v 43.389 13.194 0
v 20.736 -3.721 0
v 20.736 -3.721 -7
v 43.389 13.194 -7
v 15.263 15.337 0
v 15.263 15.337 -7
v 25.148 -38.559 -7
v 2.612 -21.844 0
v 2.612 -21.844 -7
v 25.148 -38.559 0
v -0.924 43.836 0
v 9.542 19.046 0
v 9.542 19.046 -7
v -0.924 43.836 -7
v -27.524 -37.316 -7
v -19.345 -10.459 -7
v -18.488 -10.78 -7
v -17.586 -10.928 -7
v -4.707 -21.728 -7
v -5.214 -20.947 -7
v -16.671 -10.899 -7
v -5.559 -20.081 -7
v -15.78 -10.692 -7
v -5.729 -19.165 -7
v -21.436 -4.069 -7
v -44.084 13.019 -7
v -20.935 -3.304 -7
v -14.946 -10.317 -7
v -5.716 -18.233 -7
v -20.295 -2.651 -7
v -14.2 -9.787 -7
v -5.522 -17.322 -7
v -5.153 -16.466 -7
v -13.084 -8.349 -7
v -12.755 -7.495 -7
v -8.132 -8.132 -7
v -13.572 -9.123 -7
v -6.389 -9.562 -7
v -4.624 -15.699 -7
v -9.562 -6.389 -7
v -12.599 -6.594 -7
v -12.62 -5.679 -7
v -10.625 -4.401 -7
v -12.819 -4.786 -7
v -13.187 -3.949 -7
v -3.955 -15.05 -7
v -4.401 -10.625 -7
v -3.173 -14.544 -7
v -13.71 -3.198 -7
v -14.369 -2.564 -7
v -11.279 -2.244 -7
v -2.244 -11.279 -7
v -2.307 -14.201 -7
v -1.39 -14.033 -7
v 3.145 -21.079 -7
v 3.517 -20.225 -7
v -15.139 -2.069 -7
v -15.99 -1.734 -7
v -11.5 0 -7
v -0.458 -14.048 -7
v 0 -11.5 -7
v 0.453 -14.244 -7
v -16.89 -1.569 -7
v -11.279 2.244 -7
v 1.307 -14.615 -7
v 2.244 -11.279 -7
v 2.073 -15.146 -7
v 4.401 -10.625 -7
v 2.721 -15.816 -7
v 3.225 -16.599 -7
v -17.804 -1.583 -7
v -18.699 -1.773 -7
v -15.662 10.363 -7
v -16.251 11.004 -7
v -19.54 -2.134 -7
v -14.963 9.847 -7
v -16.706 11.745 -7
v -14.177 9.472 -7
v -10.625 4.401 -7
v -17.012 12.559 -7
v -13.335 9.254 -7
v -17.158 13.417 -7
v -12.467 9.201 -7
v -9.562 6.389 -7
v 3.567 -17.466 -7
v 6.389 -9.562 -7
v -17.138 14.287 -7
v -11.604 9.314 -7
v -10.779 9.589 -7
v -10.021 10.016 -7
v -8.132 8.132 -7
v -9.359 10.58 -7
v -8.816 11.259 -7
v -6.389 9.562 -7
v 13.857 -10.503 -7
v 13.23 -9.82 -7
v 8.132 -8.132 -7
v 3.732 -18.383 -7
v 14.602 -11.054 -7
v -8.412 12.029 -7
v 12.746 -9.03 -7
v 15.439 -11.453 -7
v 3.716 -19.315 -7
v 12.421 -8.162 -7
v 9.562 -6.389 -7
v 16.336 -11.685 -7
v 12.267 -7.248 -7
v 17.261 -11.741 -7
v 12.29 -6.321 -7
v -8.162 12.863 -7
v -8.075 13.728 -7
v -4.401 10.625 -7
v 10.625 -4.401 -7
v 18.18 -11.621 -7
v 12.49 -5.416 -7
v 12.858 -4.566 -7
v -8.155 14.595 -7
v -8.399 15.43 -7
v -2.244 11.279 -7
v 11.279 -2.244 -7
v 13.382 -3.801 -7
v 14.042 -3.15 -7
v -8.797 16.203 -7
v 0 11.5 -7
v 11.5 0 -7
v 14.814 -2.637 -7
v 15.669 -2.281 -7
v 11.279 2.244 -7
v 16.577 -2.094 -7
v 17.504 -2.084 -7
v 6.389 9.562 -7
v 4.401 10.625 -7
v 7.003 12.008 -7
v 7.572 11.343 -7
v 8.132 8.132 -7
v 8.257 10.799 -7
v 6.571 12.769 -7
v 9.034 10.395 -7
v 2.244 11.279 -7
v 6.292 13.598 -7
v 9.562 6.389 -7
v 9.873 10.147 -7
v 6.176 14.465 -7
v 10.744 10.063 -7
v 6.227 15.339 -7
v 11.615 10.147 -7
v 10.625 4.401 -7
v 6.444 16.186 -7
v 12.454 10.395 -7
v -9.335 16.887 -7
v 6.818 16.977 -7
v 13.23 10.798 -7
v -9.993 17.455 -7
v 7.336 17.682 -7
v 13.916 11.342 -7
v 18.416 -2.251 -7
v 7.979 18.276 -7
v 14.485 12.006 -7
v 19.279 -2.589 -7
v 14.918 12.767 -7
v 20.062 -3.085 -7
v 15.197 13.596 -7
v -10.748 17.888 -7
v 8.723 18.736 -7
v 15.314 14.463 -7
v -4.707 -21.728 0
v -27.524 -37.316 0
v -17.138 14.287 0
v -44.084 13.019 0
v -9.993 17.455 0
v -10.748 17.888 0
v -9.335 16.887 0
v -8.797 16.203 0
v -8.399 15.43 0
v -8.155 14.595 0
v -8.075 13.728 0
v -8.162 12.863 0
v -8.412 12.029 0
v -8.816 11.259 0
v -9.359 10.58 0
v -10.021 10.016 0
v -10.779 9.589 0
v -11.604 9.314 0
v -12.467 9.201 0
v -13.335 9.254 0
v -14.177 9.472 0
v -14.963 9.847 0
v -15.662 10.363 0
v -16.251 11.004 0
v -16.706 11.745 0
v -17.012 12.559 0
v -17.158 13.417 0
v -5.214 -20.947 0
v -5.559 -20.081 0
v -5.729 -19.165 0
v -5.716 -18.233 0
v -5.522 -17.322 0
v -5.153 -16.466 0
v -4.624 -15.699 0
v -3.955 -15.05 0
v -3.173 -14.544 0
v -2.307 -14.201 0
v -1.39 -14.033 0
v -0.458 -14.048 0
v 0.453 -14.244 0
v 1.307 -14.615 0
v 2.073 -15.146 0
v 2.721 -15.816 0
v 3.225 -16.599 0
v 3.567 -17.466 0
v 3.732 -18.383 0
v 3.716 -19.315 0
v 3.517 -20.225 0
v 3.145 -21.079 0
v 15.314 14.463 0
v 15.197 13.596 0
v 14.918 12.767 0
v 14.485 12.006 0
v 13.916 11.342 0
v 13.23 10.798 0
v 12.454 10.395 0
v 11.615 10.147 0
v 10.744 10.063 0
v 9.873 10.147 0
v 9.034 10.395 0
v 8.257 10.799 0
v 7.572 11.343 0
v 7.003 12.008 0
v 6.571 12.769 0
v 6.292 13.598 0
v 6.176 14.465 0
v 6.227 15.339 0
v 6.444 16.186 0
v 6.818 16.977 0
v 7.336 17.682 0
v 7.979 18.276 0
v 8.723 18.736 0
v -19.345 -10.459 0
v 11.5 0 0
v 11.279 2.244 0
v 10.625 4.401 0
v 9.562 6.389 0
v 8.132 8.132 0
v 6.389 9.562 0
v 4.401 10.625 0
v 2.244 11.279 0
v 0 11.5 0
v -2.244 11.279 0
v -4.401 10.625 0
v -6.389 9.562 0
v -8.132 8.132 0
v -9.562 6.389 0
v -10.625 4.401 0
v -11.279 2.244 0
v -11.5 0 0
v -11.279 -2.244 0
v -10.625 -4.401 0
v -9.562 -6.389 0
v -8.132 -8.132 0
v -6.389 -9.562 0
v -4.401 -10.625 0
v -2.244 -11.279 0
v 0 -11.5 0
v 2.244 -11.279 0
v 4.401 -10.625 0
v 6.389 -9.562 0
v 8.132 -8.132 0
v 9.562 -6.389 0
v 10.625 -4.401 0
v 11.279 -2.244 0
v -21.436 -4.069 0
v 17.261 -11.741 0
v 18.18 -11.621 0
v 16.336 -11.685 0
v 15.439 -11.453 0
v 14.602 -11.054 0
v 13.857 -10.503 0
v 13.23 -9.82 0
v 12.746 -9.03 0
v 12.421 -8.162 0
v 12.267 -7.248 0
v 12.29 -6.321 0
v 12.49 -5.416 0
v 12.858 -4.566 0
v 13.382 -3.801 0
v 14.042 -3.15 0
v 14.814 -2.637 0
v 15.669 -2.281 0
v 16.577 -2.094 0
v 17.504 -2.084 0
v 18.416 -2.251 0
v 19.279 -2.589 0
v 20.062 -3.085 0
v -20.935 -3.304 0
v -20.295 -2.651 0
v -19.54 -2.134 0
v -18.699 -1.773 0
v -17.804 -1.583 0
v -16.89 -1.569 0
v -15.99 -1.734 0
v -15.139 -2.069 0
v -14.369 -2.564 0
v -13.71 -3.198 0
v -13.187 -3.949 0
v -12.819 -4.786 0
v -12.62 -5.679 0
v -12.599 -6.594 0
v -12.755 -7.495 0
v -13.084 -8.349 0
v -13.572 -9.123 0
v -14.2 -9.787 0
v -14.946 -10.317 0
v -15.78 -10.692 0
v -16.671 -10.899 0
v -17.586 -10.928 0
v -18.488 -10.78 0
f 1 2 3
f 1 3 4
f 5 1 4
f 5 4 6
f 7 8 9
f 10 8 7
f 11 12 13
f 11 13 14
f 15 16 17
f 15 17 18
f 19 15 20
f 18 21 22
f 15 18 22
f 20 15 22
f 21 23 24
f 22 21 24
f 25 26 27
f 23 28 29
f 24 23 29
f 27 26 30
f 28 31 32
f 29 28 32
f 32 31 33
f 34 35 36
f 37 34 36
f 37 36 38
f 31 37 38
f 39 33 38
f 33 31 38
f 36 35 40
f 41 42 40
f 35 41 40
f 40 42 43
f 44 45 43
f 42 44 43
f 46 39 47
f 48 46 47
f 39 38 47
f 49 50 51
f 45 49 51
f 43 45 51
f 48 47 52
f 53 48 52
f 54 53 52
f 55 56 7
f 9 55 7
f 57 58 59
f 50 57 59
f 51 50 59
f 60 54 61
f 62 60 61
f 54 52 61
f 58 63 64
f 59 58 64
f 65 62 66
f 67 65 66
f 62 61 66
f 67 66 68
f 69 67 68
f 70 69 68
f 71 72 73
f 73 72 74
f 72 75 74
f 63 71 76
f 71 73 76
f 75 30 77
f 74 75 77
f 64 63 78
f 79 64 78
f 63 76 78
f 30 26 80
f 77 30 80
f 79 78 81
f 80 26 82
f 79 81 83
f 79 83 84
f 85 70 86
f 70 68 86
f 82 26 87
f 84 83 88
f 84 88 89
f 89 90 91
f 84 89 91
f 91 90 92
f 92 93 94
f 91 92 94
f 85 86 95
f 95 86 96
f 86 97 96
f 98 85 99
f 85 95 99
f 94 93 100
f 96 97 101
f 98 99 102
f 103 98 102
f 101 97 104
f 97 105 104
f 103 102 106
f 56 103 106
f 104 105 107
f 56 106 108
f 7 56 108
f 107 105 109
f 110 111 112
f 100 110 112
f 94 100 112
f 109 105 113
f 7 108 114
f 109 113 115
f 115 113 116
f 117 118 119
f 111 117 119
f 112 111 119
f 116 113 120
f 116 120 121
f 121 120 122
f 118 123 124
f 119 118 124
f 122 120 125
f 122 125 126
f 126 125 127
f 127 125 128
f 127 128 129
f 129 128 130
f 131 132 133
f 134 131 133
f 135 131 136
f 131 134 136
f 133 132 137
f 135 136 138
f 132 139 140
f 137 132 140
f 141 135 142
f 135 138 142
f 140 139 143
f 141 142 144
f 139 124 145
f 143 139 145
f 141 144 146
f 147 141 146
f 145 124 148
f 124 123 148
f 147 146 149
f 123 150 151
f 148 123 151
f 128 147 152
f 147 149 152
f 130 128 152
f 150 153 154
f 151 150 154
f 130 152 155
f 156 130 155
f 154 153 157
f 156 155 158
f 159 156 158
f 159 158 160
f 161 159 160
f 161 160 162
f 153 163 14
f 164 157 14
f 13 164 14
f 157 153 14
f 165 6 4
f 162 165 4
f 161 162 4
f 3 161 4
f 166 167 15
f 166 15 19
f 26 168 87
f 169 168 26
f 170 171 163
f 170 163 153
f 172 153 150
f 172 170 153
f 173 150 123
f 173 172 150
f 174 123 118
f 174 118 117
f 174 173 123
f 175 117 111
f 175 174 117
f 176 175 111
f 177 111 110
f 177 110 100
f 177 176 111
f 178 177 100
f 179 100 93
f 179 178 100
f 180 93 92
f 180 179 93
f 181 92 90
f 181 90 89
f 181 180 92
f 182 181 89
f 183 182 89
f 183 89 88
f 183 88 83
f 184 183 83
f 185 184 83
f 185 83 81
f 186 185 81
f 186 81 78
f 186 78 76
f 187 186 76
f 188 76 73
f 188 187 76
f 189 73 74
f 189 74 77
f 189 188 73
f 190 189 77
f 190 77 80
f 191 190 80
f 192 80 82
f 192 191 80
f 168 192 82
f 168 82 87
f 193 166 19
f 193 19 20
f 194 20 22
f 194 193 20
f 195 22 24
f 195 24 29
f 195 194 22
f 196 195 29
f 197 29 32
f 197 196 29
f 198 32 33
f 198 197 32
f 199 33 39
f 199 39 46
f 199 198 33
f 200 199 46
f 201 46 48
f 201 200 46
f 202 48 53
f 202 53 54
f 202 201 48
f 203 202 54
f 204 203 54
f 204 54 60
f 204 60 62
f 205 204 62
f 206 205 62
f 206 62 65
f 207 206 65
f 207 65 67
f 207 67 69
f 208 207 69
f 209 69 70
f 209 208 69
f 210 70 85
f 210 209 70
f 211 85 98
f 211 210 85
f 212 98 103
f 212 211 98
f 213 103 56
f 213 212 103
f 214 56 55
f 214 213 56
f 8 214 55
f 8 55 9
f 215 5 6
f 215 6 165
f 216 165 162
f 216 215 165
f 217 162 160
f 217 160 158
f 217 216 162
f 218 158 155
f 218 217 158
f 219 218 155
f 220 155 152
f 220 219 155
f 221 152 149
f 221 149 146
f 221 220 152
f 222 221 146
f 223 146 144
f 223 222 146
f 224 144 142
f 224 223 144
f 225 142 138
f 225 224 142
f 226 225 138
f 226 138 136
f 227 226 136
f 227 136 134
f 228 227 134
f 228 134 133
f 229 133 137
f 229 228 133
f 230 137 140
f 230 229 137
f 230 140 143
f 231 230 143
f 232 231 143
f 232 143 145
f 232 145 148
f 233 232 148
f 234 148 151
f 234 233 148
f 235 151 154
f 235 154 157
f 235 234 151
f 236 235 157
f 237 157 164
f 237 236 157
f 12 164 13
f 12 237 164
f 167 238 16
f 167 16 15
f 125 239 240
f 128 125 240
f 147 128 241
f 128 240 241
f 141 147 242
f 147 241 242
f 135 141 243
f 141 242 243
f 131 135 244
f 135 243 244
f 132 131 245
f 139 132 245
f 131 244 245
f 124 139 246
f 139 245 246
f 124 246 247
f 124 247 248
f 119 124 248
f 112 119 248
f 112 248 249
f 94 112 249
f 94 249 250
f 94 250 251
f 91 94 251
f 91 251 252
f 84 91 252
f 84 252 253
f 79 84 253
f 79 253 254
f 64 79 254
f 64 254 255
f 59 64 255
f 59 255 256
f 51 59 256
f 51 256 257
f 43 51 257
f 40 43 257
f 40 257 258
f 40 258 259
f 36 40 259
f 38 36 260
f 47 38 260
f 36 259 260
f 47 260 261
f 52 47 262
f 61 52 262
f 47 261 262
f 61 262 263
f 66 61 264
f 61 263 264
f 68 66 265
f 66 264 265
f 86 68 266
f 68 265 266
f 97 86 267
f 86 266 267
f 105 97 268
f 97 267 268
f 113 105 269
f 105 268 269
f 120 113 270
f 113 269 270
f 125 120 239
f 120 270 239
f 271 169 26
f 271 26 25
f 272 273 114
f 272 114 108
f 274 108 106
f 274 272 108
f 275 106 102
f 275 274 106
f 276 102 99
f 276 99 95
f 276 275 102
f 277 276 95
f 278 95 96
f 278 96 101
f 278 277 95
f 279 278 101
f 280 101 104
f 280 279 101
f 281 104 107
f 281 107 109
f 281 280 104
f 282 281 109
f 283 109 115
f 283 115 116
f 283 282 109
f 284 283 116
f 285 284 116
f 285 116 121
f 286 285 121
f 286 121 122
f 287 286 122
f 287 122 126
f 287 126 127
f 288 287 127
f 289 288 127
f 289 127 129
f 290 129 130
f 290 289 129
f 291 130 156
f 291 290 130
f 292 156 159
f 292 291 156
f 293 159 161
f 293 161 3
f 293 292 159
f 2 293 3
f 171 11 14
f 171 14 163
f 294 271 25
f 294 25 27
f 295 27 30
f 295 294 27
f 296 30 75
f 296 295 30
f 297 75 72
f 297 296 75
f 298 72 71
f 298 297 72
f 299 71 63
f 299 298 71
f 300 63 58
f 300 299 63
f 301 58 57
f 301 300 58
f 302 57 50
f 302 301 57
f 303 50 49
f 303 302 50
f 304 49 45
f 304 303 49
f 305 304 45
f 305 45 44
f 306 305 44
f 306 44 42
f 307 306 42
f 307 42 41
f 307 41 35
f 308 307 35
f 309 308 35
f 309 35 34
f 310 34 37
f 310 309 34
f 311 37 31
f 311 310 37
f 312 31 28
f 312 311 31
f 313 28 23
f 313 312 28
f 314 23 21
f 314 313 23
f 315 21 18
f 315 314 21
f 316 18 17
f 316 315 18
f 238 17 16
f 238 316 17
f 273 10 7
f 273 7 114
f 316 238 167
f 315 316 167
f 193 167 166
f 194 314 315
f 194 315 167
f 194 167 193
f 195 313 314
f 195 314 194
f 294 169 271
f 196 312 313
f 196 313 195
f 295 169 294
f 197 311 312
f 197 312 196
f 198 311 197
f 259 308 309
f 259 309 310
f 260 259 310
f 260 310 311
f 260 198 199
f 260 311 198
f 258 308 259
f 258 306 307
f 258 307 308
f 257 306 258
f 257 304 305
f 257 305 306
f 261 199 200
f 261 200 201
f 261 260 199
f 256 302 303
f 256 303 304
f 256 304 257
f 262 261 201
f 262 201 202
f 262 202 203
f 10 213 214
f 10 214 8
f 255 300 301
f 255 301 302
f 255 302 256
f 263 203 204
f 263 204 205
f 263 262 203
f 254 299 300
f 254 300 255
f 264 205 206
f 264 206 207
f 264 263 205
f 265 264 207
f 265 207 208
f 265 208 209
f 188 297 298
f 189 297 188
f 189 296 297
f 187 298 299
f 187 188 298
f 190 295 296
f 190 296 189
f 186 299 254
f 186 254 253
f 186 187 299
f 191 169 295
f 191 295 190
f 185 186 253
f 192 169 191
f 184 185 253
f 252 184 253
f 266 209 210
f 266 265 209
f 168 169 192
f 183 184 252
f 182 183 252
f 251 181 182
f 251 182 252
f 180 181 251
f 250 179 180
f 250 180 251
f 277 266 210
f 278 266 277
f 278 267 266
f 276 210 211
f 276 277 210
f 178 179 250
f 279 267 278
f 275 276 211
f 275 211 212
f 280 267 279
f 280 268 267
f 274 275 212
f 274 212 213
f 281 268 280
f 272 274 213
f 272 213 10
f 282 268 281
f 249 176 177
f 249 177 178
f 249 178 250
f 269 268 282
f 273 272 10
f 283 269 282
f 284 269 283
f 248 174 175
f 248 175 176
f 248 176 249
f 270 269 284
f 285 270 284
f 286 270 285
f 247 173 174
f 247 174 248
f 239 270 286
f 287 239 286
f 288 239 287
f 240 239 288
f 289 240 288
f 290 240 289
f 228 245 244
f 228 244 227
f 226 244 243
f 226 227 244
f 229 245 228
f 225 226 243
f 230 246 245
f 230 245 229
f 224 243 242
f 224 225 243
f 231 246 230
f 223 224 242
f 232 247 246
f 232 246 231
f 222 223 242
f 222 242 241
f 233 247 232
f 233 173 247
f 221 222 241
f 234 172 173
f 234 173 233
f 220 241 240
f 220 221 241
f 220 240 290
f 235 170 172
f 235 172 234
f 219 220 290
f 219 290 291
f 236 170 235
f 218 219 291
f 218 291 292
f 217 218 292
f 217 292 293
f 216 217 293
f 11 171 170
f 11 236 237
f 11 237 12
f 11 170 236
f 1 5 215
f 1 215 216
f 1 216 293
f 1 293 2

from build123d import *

# Parameters (mm, degrees)
F2_DEPTH = 7
F3_R     = 11.5
F4_DEPTH = 25.4


with BuildPart() as f2:
    # F1 (on Top) → F2 (new body)
    with BuildSketch(Plane.XY):
        with BuildLine():
            ThreePointArc((-10.747828, 17.888175), (-10.389928, 9.784178), (-17.137527, 14.286707))
            Line((-17.137527, 14.286707), (-44.084065, 13.019221))
            Line((-44.084065, 13.019221), (-21.436056, -4.069164))
            ThreePointArc((-21.436056, -4.069164), (-12.818896, -4.786043), (-19.344879, -10.458865))
            Line((-19.344879, -10.458865), (-27.523644, -37.316266))
            Line((-27.523644, -37.316266), (-4.706655, -21.727975))
            ThreePointArc((-4.706655, -21.727975), (-0.92379, -14.017584), (2.612456, -21.844152))
            Line((2.612456, -21.844152), (25.1483, -38.559195))
            Line((25.1483, -38.559195), (18.180093, -11.62063))
            ThreePointArc((18.180093, -11.62063), (12.489564, -5.416127), (20.735973, -3.720635))
            Line((20.735973, -3.720635), (43.389283, 13.194266))
            Line((43.389283, 13.194266), (15.262693, 15.336566))
            ThreePointArc((15.262693, 15.336566), (8.257426, 10.799074), (9.541669, 19.046092))
            Line((9.541669, 19.046092), (-0.92379, 43.835886))
            Line((-0.92379, 43.835886), (-10.747828, 17.888175))
        make_face()
    extrude(amount=-F2_DEPTH)

    # F3 (on face) → F4 (cut)
    with BuildSketch(Plane.XY):
        Circle(F3_R)
    extrude(amount=-F4_DEPTH, mode=Mode.SUBTRACT)


solid = f2.part
